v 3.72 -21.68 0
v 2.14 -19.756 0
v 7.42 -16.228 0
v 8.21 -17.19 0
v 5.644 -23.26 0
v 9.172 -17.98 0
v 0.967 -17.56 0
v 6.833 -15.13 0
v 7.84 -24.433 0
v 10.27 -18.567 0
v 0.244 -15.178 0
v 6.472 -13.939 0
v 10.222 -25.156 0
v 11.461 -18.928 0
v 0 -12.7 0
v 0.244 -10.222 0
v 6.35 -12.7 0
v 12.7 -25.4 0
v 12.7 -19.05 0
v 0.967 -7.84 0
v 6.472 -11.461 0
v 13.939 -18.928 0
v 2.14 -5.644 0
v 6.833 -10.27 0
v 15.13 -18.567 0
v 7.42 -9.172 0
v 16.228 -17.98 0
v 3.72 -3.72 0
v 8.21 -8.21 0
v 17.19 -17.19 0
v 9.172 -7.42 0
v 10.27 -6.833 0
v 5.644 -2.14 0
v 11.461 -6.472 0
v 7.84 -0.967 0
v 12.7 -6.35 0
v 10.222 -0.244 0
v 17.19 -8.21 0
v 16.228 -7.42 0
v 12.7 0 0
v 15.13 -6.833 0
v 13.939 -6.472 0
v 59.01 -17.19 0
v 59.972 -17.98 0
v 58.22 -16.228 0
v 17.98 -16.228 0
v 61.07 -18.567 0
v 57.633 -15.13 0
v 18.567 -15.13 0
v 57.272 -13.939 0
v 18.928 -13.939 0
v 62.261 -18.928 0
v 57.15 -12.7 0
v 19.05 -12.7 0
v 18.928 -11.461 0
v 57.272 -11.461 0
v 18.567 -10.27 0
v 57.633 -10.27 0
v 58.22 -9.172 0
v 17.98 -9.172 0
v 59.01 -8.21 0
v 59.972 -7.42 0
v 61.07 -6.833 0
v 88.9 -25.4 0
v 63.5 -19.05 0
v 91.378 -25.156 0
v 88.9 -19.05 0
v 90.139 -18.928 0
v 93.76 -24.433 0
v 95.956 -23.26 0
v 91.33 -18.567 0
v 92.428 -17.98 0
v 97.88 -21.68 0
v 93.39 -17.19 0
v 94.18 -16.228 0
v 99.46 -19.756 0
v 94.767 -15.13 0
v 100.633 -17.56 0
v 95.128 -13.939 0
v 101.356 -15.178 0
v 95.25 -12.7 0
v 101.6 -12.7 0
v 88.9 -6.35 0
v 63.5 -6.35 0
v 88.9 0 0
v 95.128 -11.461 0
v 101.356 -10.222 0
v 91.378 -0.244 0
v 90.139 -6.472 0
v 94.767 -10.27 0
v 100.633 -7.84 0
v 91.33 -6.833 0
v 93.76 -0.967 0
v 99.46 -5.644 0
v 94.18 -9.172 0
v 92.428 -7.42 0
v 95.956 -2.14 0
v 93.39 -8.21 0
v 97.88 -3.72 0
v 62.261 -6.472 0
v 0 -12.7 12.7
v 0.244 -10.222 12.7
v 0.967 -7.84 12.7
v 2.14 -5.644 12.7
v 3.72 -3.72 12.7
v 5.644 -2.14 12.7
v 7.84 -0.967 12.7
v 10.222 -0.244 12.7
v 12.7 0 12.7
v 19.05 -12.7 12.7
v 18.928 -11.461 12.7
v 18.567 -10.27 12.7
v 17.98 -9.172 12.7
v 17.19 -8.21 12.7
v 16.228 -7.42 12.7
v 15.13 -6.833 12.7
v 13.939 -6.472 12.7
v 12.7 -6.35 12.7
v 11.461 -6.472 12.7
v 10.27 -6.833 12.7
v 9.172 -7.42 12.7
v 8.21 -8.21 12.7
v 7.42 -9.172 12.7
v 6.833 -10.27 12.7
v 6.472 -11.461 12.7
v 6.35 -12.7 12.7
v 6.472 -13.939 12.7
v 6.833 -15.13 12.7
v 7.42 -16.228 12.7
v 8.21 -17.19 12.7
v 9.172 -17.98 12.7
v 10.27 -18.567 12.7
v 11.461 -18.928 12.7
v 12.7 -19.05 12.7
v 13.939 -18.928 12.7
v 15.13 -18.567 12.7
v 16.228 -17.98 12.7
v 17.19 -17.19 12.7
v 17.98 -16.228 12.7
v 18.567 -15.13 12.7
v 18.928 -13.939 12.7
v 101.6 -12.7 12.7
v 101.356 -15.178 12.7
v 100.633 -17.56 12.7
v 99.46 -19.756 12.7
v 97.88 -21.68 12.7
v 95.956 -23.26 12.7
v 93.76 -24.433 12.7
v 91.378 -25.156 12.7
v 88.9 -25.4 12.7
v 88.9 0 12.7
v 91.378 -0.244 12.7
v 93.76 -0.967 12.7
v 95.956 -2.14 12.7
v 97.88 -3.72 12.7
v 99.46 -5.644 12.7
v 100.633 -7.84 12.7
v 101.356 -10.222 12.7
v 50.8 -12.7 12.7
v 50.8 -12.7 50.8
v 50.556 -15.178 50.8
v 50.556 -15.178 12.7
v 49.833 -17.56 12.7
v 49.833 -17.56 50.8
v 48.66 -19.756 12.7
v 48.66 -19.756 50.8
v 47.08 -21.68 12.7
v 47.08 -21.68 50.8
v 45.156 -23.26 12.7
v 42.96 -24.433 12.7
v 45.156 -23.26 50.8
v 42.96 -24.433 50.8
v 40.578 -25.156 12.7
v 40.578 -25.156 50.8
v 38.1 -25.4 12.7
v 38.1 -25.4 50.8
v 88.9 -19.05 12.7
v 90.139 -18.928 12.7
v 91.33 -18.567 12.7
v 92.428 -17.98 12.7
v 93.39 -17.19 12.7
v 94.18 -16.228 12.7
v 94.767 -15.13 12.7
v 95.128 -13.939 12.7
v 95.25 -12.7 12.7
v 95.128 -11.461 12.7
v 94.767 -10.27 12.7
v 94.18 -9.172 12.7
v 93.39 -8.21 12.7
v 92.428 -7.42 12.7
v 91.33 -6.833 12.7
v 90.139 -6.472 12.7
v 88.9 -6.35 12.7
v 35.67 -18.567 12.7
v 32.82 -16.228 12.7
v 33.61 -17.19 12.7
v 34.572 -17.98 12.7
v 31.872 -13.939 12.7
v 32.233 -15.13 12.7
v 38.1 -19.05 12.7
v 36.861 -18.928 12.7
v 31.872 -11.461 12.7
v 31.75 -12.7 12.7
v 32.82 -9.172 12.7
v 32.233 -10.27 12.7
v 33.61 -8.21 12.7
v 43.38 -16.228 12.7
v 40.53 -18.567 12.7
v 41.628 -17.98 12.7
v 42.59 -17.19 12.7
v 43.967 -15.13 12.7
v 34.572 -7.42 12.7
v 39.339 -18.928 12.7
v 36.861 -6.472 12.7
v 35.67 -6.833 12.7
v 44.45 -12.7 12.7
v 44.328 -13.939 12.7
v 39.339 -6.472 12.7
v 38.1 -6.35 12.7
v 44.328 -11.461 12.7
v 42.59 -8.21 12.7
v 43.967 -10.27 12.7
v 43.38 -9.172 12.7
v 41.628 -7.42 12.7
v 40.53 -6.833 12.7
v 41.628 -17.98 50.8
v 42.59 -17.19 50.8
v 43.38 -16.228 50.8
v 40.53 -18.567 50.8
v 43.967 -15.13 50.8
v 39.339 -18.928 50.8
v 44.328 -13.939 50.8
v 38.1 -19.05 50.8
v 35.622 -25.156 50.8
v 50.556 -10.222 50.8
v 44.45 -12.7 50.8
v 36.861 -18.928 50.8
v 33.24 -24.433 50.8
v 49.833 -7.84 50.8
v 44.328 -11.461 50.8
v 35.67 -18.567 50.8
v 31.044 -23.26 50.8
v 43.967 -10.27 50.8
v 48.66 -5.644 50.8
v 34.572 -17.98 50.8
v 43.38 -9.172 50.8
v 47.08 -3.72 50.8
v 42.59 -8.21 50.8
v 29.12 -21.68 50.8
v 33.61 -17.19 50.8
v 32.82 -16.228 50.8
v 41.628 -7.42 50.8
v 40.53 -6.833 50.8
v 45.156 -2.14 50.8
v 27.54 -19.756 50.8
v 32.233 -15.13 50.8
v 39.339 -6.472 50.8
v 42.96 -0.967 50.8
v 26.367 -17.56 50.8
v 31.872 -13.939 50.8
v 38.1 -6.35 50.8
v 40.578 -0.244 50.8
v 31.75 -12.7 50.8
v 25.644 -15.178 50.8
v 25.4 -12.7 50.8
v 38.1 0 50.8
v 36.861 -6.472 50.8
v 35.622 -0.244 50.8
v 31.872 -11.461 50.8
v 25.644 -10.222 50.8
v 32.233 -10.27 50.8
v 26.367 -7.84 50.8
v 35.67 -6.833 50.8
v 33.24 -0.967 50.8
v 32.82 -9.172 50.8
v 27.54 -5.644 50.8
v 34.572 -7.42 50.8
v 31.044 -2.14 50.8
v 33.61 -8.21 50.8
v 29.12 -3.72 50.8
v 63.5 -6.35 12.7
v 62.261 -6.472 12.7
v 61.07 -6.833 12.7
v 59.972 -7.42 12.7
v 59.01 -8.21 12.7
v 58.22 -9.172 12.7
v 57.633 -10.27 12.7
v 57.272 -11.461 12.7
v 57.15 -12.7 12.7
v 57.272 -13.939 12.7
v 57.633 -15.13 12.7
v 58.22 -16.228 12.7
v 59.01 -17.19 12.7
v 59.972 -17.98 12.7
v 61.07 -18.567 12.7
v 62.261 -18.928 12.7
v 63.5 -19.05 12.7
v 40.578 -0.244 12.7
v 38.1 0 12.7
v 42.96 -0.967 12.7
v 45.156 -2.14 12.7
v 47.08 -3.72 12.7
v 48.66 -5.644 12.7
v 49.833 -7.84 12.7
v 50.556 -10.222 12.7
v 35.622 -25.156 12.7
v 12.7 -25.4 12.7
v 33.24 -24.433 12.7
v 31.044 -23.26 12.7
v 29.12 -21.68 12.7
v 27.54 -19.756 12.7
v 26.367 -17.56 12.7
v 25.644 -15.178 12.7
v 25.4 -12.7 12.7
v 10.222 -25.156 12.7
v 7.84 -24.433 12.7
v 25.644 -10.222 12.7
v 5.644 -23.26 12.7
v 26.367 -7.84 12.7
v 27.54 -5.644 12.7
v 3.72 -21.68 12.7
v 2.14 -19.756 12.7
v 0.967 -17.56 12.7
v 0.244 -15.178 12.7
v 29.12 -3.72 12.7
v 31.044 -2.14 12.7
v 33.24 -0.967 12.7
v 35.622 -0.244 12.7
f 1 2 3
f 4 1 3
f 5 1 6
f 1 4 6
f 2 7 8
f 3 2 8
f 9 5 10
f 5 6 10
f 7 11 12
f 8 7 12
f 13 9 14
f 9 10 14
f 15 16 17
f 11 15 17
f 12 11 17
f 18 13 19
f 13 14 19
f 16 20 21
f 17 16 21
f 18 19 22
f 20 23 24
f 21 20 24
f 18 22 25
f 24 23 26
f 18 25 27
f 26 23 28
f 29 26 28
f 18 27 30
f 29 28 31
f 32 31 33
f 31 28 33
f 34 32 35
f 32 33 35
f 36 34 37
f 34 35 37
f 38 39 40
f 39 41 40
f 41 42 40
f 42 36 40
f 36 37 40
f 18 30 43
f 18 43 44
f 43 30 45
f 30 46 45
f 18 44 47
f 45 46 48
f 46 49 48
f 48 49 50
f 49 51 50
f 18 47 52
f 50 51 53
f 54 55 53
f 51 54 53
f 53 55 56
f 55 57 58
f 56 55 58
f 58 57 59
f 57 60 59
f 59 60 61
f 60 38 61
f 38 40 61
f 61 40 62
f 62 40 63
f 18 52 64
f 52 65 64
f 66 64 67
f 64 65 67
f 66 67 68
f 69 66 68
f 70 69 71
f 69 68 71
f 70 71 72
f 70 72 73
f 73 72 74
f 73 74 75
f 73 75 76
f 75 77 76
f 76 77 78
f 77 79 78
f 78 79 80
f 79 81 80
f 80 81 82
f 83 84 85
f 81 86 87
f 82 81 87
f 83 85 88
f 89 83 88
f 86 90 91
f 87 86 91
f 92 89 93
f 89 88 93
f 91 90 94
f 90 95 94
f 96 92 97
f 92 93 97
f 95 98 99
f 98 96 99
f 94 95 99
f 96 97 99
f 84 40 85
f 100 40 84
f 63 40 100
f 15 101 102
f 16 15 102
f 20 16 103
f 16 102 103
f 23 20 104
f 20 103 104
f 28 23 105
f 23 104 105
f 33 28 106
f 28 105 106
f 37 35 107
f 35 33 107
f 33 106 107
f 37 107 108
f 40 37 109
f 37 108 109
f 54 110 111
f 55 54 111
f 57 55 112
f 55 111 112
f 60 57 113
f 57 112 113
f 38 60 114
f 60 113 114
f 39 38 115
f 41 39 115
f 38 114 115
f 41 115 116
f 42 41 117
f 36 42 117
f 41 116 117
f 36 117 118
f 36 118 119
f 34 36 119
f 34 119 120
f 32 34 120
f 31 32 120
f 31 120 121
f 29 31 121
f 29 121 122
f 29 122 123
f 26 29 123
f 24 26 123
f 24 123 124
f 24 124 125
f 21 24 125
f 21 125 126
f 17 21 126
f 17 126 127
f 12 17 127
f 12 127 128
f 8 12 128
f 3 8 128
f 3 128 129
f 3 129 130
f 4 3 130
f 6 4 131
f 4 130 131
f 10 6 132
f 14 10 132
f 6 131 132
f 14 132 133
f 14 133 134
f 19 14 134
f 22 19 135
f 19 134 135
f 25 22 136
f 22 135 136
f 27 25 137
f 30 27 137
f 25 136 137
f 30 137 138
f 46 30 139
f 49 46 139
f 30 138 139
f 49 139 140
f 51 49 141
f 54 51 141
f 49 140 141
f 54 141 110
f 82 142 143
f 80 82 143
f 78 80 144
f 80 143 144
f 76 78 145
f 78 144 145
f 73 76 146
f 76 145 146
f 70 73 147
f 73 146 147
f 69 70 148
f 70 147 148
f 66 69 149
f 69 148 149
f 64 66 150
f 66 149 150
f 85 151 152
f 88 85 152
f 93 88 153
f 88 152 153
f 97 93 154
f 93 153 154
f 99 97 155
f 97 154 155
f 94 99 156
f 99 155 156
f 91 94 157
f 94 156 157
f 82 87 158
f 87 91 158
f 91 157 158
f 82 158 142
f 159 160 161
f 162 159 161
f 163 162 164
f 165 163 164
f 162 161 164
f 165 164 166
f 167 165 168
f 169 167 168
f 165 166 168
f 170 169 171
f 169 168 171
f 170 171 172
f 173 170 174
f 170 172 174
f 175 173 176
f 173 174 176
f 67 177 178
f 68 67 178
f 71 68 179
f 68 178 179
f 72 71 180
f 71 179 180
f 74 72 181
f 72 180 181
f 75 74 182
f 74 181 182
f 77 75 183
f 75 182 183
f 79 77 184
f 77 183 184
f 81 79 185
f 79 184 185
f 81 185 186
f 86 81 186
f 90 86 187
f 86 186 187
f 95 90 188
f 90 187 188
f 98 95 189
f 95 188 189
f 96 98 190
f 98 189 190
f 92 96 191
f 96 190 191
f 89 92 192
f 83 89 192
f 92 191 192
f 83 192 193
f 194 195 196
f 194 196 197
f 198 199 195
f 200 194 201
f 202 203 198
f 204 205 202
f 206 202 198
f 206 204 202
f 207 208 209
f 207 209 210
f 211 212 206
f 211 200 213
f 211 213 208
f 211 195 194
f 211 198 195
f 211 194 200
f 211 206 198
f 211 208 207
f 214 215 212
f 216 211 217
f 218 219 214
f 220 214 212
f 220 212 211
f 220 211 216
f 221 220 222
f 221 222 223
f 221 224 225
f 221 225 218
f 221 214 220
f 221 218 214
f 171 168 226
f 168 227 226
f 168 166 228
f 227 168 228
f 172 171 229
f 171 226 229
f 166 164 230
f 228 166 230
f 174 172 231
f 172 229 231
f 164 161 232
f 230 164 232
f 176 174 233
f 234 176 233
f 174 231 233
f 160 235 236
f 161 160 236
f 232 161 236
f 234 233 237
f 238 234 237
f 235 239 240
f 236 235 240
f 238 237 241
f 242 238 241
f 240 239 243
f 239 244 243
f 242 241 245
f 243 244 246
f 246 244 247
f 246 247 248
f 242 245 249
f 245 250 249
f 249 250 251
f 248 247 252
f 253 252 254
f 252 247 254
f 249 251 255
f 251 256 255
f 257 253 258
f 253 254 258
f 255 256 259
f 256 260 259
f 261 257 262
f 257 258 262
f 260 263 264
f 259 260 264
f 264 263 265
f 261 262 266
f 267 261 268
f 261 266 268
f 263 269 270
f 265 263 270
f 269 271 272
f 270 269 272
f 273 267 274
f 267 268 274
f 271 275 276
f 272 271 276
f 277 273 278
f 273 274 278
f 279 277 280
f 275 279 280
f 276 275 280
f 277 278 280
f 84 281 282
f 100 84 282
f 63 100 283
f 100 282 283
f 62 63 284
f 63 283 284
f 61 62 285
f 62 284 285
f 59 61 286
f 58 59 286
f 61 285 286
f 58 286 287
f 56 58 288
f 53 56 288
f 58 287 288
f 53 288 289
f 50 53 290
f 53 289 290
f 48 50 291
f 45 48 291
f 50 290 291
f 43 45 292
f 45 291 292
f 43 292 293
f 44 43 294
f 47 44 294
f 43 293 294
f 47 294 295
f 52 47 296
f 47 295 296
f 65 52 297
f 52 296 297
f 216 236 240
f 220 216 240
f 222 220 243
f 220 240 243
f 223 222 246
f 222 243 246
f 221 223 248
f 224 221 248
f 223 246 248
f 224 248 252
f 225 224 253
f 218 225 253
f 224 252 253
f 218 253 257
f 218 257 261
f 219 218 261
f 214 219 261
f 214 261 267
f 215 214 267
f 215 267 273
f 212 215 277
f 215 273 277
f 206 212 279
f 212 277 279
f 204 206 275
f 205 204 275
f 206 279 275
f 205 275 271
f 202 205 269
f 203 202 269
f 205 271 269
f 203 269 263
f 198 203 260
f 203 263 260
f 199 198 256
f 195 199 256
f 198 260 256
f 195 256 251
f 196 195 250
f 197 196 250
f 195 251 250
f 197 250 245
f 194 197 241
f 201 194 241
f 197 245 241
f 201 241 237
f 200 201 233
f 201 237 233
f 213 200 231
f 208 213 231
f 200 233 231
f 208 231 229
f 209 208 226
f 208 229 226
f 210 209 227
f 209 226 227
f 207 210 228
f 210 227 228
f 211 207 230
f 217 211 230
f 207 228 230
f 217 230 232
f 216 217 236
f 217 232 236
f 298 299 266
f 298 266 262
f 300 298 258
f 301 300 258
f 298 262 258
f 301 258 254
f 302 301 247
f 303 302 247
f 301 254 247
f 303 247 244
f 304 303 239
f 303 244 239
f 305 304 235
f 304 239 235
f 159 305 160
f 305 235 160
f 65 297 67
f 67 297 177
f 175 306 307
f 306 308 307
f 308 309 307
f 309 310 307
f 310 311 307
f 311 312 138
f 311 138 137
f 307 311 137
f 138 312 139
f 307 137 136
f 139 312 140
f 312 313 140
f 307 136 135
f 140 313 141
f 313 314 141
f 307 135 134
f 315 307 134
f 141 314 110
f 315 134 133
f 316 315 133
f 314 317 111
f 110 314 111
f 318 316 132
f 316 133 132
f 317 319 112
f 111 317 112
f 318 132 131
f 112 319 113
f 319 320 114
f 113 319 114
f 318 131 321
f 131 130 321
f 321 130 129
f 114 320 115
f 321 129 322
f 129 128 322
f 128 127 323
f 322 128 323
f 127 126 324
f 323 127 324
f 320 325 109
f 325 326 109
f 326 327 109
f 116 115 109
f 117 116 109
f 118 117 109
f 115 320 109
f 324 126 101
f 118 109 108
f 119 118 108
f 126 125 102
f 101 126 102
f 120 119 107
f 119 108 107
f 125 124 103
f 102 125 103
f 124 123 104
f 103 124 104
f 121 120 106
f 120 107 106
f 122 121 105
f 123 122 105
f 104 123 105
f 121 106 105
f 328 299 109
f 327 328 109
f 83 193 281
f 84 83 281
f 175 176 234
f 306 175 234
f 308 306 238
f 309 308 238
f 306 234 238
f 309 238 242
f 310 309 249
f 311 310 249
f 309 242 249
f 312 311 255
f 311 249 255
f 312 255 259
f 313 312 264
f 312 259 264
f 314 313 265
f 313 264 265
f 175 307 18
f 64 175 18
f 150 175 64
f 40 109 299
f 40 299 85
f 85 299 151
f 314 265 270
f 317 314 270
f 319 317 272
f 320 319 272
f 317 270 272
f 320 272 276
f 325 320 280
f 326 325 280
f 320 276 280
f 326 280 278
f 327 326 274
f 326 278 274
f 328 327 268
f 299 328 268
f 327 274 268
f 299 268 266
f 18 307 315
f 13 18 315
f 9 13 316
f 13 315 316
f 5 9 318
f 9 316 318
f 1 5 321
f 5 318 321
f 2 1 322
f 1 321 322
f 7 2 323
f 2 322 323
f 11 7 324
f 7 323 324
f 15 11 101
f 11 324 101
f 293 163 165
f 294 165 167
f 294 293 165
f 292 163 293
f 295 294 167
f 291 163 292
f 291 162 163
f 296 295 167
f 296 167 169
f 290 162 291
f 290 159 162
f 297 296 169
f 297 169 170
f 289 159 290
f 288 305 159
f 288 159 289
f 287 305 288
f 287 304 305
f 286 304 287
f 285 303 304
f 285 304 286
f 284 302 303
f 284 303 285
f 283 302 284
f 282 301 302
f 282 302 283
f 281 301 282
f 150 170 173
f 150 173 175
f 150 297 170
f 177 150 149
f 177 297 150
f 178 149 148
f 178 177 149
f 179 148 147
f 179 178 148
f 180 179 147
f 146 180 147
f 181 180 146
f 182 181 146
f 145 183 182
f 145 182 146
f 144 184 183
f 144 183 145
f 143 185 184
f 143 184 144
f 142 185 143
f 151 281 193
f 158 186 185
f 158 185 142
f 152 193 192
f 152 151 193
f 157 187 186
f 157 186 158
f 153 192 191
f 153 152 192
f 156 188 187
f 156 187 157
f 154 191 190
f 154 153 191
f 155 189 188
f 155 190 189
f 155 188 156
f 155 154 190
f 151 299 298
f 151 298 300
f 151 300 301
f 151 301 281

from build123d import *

# Parameters (mm, degrees)
F1_DEPTH = 25.4
F2_R     = 6.35
F3_DEPTH = 25.4
F4_R     = 6.35
F5_DEPTH = 38.1
F7_DEPTH = 25.4


with BuildPart() as f1:
    # F0 (on Front) → F1 (new body)
    with BuildSketch(Plane.XZ):
        Polygon((0, 12.7), (0, 0), (101.6, 0), (101.6, 12.7), (50.8, 12.7), (50.8, 50.8), (25.4, 50.8), (25.4, 12.7), align=None)
    extrude(amount=F1_DEPTH)

    # F2 (on face) → F3 (cut)
    with BuildSketch(Plane.XY.offset(12.7)):
        with Locations((12.7, -12.7)):
            Circle(F2_R)
        with BuildLine():
            ThreePointArc((0, -12.7), (3.719744, -3.719744), (12.7, 0))
            Line((12.7, 0), (0, 0))
            Line((0, 0), (0, -12.7))
        make_face()
        with BuildLine():
            ThreePointArc((12.7, -25.4), (3.719744, -21.680256), (0, -12.7))
            Line((0, -12.7), (0, -25.4))
            Line((0, -25.4), (12.7, -25.4))
        make_face()
    extrude(amount=-F3_DEPTH, mode=Mode.SUBTRACT)

    # F4 (on face) → F5 (cut)
    with BuildSketch(Plane.XY.offset(50.8)):
        with BuildLine():
            ThreePointArc((38.1, 0), (47.080256, -3.719744), (50.8, -12.7))
            Line((50.8, -12.7), (50.8, 0))
            Line((50.8, 0), (38.1, 0))
        make_face()
        with Locations((38.1, -12.7)):
            Circle(F4_R)
        with BuildLine():
            ThreePointArc((25.4, -12.7), (29.119744, -3.719744), (38.1, 0))
            Line((38.1, 0), (25.4, 0))
            Line((25.4, 0), (25.4, -12.7))
        make_face()
        with BuildLine():
            Line((25.4, -25.4), (38.1, -25.4))
            ThreePointArc((38.1, -25.4), (29.119744, -21.680256), (25.4, -12.7))
            Line((25.4, -12.7), (25.4, -25.4))
        make_face()
        with BuildLine():
            Line((50.8, -25.4), (50.8, -12.7))
            ThreePointArc((50.8, -12.7), (47.080256, -21.680256), (38.1, -25.4))
            Line((38.1, -25.4), (50.8, -25.4))
        make_face()
    extrude(amount=-F5_DEPTH, mode=Mode.SUBTRACT)

    # F6 (on face) → F7 (cut)
    with BuildSketch(Plane.XY.offset(12.7)):
        with BuildLine():
            ThreePointArc((88.9, -19.05), (82.55, -12.7), (88.9, -6.35))
            Line((88.9, -6.35), (63.5, -6.35))
            ThreePointArc((63.5, -6.35), (67.990128, -8.209872), (69.85, -12.7))
            ThreePointArc((69.85, -12.7), (67.990128, -17.190128), (63.5, -19.05))
            Line((63.5, -19.05), (88.9, -19.05))
        make_face()
        with BuildLine():
            ThreePointArc((69.85, -12.7), (67.990128, -8.209872), (63.5, -6.35))
            ThreePointArc((63.5, -6.35), (57.15, -12.7), (63.5, -19.05))
            ThreePointArc((63.5, -19.05), (67.990128, -17.190128), (69.85, -12.7))
        make_face()
        with BuildLine():
            ThreePointArc((88.9, -19.05), (93.390128, -17.190128), (95.25, -12.7))
            ThreePointArc((95.25, -12.7), (93.390128, -8.209872), (88.9, -6.35))
            ThreePointArc((88.9, -6.35), (82.55, -12.7), (88.9, -19.05))
        make_face()
        with BuildLine():
            ThreePointArc((101.6, -12.7), (97.880256, -21.680256), (88.9, -25.4))
            Line((88.9, -25.4), (101.6, -25.4))
            Line((101.6, -25.4), (101.6, -12.7))
        make_face()
        with BuildLine():
            ThreePointArc((88.9, 0), (97.880256, -3.719744), (101.6, -12.7))
            Line((101.6, -12.7), (101.6, 0))
            Line((101.6, 0), (88.9, 0))
        make_face()
    extrude(amount=-F7_DEPTH, mode=Mode.SUBTRACT)


solid = f1.part
